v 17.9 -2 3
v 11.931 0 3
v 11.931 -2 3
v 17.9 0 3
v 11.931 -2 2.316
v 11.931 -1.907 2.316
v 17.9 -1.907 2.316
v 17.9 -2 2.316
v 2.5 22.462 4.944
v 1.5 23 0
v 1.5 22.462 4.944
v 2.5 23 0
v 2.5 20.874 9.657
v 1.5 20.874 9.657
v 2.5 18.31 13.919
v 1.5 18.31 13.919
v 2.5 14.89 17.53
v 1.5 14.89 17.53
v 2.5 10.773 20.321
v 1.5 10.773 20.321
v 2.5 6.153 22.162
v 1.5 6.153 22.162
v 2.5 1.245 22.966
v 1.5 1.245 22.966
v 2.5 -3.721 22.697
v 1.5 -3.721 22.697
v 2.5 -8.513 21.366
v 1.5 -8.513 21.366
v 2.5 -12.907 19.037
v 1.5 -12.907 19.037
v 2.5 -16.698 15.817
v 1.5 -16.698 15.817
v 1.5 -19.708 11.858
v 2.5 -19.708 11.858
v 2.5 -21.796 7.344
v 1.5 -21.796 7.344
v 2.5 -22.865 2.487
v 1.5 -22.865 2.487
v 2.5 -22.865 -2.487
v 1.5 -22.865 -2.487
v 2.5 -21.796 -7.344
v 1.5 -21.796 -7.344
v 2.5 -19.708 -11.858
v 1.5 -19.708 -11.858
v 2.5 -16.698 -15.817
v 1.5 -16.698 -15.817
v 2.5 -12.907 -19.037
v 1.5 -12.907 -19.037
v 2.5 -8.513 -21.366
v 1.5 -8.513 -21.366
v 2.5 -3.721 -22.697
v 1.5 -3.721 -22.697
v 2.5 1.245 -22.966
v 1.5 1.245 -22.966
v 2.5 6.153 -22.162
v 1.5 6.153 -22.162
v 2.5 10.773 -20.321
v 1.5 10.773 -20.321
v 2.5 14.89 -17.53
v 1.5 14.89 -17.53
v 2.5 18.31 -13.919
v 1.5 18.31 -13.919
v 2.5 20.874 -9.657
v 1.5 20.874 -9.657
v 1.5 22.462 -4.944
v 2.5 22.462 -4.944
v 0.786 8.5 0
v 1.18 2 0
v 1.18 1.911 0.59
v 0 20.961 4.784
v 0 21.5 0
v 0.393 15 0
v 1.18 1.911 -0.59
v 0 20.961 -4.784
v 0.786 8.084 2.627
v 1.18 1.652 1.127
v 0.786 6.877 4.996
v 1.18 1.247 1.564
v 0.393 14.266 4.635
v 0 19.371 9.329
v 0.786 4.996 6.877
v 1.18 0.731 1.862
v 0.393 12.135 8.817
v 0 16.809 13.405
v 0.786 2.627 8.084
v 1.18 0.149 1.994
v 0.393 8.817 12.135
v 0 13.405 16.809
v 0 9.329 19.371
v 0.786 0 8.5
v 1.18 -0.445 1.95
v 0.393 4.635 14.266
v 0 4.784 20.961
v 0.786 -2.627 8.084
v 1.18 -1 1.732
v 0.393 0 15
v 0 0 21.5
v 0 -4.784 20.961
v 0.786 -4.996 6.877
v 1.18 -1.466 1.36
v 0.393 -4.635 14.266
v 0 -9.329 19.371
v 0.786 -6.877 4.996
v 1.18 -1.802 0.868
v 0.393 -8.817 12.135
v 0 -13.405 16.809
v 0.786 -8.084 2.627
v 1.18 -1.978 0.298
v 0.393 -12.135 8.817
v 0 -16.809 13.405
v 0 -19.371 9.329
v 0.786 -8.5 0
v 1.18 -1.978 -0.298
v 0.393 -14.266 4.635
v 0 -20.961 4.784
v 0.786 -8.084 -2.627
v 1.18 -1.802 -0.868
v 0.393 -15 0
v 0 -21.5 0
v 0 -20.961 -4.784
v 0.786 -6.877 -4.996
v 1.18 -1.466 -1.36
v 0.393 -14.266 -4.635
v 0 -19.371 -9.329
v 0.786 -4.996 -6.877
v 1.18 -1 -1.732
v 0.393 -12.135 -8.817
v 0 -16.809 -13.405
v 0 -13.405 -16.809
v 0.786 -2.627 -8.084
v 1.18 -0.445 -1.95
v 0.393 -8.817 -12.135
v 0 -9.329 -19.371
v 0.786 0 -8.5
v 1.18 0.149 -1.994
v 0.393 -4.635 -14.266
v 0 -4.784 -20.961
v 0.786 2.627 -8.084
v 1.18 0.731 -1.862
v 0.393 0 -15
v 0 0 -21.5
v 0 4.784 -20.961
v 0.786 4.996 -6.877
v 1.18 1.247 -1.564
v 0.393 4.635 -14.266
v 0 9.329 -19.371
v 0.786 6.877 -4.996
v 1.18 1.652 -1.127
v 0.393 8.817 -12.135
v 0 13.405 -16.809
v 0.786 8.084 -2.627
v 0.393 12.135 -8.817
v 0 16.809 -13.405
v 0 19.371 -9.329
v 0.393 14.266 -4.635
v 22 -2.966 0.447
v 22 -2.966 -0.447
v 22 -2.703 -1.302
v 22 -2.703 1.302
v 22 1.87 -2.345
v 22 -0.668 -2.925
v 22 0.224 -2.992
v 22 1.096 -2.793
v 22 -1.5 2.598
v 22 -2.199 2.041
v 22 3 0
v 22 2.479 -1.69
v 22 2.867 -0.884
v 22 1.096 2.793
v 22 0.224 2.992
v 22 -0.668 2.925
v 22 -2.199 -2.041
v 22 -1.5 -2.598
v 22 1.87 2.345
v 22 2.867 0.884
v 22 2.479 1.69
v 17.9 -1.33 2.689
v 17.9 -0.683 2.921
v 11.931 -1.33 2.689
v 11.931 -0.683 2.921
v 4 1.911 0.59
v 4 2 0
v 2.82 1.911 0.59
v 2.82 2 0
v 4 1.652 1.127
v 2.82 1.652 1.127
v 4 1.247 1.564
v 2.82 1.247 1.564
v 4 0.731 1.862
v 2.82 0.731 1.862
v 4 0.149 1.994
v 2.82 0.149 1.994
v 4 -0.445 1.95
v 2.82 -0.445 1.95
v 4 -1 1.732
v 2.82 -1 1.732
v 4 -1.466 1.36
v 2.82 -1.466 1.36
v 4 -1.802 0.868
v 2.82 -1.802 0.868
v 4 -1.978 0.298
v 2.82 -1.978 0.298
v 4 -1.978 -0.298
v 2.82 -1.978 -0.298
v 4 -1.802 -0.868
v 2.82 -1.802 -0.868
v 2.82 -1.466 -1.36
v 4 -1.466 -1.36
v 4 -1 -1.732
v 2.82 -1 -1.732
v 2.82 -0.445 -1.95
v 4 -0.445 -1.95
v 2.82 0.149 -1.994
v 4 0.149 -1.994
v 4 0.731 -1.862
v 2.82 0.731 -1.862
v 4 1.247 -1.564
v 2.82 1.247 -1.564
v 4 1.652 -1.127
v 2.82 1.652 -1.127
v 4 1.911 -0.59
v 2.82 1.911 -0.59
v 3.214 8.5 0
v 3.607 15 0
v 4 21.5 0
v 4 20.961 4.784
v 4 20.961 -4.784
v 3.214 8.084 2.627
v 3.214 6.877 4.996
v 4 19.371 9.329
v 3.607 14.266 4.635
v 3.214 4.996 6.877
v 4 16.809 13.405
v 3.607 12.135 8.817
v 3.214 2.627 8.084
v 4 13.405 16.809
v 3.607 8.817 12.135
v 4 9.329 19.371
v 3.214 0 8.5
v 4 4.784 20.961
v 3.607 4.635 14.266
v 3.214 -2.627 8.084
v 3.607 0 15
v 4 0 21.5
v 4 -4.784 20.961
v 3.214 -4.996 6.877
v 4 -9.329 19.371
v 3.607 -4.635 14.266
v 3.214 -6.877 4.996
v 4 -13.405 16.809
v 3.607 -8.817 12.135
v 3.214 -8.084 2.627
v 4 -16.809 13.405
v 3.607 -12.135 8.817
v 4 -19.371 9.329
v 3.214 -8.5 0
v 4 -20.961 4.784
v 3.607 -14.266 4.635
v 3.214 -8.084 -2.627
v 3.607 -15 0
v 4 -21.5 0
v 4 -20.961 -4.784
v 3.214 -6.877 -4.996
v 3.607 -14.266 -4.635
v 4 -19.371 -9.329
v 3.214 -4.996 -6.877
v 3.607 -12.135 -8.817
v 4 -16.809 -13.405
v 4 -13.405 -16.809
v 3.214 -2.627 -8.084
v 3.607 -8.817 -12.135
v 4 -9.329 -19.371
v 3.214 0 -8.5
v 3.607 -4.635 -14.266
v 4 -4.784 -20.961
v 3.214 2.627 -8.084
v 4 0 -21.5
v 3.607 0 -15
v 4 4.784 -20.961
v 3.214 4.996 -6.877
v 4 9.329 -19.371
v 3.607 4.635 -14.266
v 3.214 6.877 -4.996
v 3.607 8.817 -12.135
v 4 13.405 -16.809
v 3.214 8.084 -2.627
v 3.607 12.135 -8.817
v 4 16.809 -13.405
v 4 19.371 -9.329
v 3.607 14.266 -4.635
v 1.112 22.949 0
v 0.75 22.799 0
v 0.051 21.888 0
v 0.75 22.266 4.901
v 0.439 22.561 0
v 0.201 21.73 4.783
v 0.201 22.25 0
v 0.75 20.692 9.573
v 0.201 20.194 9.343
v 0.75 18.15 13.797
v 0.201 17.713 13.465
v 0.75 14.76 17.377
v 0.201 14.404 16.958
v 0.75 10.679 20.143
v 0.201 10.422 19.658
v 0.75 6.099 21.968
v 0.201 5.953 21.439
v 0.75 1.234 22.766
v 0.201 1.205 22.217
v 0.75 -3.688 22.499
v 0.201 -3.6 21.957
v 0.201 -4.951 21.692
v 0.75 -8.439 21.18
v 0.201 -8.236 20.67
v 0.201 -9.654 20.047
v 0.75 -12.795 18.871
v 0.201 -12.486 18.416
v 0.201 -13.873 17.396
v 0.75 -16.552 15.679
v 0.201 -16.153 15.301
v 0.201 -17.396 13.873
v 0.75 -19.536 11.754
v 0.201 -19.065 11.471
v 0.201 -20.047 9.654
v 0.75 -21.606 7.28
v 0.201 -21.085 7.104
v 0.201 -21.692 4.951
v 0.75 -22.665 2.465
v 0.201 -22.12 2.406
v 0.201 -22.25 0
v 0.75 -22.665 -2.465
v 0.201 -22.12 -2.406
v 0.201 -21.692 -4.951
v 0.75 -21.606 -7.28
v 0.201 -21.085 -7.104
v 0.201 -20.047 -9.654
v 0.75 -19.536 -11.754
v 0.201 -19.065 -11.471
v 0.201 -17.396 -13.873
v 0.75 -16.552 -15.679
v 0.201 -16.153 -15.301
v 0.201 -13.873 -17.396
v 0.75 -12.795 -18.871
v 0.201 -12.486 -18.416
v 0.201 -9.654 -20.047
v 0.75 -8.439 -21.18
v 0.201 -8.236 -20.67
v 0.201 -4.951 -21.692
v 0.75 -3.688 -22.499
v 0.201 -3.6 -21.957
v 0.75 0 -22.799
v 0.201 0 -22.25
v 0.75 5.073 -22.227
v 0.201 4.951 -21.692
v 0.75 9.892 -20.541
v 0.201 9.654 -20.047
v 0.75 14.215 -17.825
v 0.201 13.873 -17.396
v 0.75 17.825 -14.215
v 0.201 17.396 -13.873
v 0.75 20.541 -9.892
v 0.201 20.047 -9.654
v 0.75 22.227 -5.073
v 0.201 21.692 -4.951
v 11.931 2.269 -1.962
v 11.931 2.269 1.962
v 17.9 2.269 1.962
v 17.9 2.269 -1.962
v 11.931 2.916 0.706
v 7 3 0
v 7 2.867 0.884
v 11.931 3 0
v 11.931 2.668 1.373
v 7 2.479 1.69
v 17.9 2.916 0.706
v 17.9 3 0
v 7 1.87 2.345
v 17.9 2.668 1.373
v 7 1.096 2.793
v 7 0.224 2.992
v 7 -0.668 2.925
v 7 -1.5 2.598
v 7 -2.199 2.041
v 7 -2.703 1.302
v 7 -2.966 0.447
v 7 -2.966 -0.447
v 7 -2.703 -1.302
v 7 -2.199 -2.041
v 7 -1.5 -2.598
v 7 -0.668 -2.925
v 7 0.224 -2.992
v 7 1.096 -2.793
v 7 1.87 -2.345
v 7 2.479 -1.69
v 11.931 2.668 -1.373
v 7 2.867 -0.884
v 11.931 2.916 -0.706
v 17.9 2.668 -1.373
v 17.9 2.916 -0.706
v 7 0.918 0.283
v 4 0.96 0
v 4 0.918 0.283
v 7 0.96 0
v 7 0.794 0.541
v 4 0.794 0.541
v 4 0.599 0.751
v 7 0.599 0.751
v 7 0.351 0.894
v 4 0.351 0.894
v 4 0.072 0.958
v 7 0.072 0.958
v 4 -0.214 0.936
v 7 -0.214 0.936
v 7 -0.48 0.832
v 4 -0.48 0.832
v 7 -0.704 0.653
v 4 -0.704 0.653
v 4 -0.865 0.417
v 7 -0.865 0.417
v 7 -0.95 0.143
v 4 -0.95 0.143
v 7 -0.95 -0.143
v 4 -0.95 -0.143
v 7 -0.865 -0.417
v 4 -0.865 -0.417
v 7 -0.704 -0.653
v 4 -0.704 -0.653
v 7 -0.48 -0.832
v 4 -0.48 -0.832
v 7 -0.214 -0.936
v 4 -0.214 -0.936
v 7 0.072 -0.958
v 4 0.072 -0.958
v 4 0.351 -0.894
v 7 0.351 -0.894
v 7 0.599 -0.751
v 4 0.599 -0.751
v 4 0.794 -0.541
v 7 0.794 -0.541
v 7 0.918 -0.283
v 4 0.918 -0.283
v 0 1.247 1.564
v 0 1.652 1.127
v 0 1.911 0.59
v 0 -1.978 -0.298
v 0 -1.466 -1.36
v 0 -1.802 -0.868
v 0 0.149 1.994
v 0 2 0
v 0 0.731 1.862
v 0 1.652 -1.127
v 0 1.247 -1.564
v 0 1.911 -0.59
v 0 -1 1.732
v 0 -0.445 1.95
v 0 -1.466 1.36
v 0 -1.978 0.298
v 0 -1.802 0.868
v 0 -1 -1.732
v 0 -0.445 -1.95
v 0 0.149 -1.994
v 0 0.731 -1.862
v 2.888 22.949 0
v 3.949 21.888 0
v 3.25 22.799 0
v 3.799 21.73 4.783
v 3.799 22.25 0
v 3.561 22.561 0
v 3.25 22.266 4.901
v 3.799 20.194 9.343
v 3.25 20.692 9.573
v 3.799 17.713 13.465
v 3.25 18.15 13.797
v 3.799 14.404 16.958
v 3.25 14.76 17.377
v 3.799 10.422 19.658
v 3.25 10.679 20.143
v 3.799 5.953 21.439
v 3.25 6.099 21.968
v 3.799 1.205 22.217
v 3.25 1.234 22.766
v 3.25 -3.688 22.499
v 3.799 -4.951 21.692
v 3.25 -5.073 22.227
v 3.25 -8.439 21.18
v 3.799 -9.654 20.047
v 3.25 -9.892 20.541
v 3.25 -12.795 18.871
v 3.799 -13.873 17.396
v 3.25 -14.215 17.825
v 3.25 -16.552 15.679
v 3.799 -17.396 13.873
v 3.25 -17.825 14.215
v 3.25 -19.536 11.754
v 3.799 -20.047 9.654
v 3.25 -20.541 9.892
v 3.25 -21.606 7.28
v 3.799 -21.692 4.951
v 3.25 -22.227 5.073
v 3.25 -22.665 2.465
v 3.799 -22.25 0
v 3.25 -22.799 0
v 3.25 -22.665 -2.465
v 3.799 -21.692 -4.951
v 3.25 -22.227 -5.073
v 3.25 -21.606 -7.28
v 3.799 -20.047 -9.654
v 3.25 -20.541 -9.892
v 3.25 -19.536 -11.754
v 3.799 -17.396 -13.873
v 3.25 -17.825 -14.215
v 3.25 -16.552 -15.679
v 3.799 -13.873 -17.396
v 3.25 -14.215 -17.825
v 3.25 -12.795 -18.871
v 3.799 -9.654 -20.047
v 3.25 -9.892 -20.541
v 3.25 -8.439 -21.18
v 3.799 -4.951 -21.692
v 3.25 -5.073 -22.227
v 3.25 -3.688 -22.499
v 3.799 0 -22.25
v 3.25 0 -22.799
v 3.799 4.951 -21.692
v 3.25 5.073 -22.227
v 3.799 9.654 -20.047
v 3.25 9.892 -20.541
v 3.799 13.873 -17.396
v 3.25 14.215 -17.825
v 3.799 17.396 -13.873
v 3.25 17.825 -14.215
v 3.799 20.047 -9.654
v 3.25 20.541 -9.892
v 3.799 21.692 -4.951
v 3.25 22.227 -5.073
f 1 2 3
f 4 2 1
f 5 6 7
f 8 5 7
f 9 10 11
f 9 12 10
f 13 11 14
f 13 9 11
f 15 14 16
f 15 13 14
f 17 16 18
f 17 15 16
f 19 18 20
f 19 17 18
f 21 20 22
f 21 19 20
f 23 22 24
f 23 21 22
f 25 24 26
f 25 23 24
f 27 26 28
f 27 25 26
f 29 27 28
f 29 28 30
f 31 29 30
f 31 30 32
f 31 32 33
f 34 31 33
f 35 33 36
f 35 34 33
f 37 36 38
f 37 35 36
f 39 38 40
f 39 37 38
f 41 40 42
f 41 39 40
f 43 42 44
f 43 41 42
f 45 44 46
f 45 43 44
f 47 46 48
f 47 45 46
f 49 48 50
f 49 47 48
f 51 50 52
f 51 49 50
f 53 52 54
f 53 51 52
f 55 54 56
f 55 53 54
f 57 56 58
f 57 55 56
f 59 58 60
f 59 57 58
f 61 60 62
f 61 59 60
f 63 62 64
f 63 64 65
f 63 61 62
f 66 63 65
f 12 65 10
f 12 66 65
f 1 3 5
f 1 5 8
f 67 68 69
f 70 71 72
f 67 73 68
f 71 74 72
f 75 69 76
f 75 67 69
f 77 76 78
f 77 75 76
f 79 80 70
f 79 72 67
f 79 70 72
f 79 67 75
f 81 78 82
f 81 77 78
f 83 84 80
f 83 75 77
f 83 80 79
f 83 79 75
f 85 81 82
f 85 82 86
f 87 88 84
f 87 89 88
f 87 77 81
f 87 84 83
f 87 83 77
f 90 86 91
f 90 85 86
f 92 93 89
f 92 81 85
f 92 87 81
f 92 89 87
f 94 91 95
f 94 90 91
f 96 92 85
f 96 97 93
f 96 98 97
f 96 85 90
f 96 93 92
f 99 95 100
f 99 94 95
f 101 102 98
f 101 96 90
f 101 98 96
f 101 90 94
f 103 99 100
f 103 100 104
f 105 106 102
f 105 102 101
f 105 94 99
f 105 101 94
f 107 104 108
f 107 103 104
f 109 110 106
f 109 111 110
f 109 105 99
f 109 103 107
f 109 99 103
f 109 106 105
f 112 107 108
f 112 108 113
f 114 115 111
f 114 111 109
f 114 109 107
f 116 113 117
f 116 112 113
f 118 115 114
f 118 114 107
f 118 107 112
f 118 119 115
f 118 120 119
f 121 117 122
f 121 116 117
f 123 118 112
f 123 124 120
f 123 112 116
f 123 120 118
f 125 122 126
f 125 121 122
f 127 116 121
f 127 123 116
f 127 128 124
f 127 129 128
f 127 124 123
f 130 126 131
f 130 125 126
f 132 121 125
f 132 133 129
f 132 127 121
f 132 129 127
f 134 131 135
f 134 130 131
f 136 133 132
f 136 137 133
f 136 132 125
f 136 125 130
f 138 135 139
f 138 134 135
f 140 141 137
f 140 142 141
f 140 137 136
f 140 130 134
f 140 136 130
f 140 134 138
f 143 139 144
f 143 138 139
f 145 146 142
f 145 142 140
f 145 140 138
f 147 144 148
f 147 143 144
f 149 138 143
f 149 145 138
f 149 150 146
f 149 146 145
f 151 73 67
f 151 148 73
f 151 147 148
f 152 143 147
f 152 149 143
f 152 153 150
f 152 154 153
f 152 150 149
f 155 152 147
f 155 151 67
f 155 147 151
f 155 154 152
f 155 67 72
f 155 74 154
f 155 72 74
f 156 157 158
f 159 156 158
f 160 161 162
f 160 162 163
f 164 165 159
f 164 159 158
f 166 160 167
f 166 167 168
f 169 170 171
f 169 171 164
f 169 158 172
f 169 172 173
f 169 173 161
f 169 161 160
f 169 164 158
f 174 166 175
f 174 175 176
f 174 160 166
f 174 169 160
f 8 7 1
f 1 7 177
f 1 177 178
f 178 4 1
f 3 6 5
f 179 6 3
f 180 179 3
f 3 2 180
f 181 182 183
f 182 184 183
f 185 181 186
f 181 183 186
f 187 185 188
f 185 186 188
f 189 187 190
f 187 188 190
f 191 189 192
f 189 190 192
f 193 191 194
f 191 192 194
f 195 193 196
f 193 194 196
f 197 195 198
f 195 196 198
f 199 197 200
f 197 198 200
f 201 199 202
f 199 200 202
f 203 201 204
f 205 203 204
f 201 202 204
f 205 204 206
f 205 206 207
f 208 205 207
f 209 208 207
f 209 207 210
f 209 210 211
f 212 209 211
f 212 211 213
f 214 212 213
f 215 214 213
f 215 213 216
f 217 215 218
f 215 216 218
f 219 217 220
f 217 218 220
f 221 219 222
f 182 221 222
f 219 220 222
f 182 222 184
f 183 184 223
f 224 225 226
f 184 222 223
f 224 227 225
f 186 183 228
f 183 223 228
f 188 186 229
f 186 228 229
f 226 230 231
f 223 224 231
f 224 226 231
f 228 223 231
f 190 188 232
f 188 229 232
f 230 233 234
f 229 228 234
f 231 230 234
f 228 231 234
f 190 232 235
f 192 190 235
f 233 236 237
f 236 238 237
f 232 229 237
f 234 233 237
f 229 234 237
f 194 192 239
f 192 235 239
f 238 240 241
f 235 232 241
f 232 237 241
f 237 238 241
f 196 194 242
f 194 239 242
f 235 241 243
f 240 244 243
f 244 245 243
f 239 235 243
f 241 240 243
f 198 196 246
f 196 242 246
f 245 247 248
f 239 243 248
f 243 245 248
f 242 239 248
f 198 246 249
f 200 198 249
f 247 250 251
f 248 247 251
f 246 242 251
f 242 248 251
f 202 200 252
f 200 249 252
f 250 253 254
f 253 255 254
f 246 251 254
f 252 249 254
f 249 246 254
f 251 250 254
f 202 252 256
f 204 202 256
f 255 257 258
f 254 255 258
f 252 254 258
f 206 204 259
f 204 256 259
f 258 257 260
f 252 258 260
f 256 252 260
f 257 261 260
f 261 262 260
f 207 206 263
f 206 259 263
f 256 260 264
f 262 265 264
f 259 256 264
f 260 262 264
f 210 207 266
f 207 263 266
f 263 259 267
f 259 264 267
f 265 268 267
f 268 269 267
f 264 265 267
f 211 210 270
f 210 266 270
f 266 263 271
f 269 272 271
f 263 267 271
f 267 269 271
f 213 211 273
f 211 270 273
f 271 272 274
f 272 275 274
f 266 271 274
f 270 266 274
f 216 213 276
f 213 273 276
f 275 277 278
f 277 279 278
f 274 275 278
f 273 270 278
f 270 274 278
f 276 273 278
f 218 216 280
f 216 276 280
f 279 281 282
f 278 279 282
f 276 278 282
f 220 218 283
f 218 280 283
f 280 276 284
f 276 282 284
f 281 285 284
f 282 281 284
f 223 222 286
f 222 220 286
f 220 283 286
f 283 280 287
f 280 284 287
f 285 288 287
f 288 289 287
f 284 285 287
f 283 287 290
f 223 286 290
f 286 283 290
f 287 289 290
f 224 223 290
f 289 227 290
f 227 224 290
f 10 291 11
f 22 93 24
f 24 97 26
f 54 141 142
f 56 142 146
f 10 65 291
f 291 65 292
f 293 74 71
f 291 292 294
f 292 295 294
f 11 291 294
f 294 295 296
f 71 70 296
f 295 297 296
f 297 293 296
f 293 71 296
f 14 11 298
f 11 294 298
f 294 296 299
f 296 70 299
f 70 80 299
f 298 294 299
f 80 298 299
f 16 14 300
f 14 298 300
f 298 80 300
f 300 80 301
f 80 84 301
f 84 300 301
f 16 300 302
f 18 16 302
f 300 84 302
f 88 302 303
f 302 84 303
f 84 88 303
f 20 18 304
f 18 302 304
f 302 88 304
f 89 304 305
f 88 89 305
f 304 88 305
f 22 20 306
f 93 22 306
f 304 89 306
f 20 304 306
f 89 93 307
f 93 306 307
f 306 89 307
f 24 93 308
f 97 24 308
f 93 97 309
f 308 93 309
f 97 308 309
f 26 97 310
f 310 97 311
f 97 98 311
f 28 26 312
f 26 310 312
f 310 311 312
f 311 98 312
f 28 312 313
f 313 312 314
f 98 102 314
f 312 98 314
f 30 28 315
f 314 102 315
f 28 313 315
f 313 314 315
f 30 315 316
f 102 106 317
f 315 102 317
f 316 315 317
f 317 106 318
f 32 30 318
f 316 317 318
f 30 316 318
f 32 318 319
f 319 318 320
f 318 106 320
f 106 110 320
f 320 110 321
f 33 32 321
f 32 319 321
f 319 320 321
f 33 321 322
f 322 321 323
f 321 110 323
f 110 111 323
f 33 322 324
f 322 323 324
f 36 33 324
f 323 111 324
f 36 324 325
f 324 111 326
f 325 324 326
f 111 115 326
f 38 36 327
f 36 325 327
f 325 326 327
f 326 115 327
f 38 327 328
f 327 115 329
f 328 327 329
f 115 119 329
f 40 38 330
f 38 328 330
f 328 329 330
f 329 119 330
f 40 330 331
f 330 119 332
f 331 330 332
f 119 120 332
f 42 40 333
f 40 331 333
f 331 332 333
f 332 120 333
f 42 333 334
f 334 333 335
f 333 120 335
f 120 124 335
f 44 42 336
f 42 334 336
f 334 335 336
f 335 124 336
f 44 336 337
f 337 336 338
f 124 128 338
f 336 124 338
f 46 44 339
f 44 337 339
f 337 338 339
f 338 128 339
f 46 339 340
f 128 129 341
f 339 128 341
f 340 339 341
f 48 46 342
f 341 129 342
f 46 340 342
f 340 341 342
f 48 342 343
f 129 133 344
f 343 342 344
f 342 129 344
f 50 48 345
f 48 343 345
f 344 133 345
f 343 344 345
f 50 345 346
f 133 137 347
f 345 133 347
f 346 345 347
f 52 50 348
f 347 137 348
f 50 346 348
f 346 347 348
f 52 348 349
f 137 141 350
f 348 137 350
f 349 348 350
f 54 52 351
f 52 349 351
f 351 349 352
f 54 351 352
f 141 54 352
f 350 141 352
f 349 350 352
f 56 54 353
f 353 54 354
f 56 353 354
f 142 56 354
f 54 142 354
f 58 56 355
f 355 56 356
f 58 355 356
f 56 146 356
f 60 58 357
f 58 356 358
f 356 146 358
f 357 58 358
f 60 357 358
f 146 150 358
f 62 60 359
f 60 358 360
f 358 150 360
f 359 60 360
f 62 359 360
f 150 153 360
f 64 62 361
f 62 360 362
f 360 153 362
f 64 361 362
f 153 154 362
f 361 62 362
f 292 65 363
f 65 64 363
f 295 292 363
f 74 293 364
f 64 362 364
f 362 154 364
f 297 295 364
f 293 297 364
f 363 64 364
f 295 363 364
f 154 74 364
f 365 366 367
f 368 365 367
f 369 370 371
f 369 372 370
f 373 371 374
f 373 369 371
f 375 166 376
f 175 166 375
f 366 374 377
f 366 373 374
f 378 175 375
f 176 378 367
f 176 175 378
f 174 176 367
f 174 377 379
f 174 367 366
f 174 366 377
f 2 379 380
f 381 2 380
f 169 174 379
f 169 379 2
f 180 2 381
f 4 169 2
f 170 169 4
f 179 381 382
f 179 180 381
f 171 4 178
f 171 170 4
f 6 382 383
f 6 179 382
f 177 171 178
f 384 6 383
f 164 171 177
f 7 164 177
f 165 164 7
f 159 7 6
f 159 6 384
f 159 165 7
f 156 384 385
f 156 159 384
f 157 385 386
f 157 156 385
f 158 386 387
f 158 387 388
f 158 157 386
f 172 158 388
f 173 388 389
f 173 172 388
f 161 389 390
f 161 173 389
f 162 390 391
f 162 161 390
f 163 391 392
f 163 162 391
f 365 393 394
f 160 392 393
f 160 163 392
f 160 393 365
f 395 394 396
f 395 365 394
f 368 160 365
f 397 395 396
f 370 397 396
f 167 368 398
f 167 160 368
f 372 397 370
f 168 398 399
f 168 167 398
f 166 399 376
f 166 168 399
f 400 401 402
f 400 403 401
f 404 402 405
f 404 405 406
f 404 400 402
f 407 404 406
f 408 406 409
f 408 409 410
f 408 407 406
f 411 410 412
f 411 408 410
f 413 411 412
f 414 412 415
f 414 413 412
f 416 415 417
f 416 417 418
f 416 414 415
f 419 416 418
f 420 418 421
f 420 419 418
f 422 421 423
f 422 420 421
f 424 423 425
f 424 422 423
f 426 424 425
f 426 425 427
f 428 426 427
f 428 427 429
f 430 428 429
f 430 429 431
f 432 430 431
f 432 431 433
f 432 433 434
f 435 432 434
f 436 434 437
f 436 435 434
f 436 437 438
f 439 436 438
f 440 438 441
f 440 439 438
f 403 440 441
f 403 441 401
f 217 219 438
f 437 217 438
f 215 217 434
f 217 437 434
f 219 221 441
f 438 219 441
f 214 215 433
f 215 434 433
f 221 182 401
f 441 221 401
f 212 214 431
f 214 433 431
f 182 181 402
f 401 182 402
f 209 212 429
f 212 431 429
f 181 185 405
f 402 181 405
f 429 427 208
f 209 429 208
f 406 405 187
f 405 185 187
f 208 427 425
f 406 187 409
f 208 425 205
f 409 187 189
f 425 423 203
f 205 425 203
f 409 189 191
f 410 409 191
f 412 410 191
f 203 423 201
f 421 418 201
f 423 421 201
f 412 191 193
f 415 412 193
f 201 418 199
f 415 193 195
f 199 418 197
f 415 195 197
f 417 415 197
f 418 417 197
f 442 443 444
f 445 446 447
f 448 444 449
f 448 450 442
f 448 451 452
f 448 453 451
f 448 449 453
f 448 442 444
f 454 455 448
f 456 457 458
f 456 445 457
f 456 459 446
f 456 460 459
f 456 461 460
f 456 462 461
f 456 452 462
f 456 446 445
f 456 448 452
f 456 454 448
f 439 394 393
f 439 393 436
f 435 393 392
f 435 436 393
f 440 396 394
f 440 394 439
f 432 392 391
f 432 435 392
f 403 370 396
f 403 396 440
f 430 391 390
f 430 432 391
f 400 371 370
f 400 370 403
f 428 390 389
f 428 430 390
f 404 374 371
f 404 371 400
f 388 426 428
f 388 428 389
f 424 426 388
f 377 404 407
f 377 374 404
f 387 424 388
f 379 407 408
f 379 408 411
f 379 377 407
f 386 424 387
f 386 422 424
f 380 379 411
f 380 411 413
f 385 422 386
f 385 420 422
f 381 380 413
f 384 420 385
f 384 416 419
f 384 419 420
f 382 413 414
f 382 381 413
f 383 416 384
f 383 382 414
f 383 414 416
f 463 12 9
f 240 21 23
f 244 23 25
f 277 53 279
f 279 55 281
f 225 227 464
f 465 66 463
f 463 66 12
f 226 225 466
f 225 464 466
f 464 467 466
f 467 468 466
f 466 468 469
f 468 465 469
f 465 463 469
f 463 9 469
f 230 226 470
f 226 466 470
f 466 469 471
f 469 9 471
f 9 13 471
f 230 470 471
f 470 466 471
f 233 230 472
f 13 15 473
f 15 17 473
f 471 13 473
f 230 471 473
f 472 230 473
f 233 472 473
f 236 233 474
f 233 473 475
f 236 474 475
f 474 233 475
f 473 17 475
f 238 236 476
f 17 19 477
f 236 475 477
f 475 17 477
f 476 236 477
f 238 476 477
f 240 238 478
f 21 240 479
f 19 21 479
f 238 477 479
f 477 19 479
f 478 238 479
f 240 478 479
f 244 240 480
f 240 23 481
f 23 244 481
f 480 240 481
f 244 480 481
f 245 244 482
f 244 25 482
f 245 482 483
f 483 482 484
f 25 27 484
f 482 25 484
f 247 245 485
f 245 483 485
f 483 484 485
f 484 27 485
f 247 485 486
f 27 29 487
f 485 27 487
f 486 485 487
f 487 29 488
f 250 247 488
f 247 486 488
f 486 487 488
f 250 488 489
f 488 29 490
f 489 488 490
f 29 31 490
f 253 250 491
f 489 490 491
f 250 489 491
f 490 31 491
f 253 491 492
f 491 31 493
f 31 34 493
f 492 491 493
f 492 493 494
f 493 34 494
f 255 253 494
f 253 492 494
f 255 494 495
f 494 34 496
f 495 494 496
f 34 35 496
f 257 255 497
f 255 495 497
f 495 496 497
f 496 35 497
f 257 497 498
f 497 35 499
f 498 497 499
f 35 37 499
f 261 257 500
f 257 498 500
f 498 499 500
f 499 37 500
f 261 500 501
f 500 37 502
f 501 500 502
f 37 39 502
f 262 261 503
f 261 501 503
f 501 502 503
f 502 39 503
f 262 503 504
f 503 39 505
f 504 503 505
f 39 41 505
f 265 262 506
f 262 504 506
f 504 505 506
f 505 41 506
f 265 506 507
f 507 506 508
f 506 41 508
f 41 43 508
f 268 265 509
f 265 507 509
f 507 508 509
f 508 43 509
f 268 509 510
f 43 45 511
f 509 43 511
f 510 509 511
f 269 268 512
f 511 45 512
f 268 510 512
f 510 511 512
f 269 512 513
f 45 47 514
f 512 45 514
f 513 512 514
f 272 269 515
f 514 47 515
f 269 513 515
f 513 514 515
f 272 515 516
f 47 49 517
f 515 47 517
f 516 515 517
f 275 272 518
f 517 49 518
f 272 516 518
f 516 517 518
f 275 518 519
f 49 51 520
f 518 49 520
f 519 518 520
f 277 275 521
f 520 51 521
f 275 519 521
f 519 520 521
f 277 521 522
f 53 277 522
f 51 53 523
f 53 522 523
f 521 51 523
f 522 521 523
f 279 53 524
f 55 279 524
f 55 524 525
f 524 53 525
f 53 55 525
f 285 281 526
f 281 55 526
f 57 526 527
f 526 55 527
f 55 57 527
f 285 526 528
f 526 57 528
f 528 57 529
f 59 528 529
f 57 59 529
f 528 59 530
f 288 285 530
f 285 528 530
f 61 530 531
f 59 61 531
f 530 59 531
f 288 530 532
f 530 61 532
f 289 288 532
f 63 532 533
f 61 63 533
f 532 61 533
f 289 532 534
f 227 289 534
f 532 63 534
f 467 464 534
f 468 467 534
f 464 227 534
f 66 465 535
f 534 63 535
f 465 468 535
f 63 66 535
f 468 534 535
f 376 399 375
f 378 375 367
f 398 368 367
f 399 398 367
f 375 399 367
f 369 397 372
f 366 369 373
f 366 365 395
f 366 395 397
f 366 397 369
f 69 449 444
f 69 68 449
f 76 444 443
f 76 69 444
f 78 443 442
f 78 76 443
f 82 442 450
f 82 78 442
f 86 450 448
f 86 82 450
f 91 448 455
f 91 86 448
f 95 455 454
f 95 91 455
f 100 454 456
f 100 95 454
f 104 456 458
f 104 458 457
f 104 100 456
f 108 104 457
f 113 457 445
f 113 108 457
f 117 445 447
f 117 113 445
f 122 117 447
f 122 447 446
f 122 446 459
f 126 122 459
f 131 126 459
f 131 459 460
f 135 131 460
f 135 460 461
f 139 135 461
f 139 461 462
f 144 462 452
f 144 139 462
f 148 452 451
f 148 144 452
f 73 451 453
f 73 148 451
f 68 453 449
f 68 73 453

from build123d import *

# Parameters (mm, degrees)
SKETCH001_W  = 5.969217
SKETCH001_H  = 0.730541
POCKET_DEPTH = 33.001
SKETCH002_W  = 5.969217
SKETCH002_H  = 0.683974
PAD_DEPTH    = 2


with BuildPart() as part:
    # Sketch → Revolution (revolve)
    with BuildSketch(Plane.XY):
        with BuildLine():
            Line((1.5, 23), (2.5, 23))
            ThreePointArc((4, 21.5), (3.5606601718, 22.5606601718), (2.5, 23))
            Line((2.820253, 2), (4, 21.5))
            Line((4, 2), (2.820253, 2))
            Line((4, 0.960387), (4, 2))
            Line((4, 0.960387), (7, 0.960387))
            Line((7, 0.960387), (7, 3))
            Line((7, 3), (22, 3))
            Line((22, 3), (22, 0))
            Line((22, 0), (0, 0))
            Line((0, 0), (0, 2))
            Line((0, 2), (1.179747, 2))
            Line((1.179747, 2), (0, 21.5))
            ThreePointArc((1.5, 23), (0.4393398282, 22.5606601718), (0, 21.5))
        make_face()
    revolve(axis=Axis((0, 0, 0), (1, 0, 0)))

    # Sketch001 → Pocket (cut, through all)
    with BuildSketch(Plane.XY.offset(10)):
        with Locations((14.9151665, 2.6347295)):
            Rectangle(SKETCH001_W, SKETCH001_H)
    extrude(amount=-POCKET_DEPTH, mode=Mode.SUBTRACT)

    # Sketch002 → Pad (join)
    with BuildSketch(Plane.XZ):
        with Locations((14.9151665, 2.658013)):
            Rectangle(SKETCH002_W, SKETCH002_H)
    extrude(amount=PAD_DEPTH)


solid = part.part
